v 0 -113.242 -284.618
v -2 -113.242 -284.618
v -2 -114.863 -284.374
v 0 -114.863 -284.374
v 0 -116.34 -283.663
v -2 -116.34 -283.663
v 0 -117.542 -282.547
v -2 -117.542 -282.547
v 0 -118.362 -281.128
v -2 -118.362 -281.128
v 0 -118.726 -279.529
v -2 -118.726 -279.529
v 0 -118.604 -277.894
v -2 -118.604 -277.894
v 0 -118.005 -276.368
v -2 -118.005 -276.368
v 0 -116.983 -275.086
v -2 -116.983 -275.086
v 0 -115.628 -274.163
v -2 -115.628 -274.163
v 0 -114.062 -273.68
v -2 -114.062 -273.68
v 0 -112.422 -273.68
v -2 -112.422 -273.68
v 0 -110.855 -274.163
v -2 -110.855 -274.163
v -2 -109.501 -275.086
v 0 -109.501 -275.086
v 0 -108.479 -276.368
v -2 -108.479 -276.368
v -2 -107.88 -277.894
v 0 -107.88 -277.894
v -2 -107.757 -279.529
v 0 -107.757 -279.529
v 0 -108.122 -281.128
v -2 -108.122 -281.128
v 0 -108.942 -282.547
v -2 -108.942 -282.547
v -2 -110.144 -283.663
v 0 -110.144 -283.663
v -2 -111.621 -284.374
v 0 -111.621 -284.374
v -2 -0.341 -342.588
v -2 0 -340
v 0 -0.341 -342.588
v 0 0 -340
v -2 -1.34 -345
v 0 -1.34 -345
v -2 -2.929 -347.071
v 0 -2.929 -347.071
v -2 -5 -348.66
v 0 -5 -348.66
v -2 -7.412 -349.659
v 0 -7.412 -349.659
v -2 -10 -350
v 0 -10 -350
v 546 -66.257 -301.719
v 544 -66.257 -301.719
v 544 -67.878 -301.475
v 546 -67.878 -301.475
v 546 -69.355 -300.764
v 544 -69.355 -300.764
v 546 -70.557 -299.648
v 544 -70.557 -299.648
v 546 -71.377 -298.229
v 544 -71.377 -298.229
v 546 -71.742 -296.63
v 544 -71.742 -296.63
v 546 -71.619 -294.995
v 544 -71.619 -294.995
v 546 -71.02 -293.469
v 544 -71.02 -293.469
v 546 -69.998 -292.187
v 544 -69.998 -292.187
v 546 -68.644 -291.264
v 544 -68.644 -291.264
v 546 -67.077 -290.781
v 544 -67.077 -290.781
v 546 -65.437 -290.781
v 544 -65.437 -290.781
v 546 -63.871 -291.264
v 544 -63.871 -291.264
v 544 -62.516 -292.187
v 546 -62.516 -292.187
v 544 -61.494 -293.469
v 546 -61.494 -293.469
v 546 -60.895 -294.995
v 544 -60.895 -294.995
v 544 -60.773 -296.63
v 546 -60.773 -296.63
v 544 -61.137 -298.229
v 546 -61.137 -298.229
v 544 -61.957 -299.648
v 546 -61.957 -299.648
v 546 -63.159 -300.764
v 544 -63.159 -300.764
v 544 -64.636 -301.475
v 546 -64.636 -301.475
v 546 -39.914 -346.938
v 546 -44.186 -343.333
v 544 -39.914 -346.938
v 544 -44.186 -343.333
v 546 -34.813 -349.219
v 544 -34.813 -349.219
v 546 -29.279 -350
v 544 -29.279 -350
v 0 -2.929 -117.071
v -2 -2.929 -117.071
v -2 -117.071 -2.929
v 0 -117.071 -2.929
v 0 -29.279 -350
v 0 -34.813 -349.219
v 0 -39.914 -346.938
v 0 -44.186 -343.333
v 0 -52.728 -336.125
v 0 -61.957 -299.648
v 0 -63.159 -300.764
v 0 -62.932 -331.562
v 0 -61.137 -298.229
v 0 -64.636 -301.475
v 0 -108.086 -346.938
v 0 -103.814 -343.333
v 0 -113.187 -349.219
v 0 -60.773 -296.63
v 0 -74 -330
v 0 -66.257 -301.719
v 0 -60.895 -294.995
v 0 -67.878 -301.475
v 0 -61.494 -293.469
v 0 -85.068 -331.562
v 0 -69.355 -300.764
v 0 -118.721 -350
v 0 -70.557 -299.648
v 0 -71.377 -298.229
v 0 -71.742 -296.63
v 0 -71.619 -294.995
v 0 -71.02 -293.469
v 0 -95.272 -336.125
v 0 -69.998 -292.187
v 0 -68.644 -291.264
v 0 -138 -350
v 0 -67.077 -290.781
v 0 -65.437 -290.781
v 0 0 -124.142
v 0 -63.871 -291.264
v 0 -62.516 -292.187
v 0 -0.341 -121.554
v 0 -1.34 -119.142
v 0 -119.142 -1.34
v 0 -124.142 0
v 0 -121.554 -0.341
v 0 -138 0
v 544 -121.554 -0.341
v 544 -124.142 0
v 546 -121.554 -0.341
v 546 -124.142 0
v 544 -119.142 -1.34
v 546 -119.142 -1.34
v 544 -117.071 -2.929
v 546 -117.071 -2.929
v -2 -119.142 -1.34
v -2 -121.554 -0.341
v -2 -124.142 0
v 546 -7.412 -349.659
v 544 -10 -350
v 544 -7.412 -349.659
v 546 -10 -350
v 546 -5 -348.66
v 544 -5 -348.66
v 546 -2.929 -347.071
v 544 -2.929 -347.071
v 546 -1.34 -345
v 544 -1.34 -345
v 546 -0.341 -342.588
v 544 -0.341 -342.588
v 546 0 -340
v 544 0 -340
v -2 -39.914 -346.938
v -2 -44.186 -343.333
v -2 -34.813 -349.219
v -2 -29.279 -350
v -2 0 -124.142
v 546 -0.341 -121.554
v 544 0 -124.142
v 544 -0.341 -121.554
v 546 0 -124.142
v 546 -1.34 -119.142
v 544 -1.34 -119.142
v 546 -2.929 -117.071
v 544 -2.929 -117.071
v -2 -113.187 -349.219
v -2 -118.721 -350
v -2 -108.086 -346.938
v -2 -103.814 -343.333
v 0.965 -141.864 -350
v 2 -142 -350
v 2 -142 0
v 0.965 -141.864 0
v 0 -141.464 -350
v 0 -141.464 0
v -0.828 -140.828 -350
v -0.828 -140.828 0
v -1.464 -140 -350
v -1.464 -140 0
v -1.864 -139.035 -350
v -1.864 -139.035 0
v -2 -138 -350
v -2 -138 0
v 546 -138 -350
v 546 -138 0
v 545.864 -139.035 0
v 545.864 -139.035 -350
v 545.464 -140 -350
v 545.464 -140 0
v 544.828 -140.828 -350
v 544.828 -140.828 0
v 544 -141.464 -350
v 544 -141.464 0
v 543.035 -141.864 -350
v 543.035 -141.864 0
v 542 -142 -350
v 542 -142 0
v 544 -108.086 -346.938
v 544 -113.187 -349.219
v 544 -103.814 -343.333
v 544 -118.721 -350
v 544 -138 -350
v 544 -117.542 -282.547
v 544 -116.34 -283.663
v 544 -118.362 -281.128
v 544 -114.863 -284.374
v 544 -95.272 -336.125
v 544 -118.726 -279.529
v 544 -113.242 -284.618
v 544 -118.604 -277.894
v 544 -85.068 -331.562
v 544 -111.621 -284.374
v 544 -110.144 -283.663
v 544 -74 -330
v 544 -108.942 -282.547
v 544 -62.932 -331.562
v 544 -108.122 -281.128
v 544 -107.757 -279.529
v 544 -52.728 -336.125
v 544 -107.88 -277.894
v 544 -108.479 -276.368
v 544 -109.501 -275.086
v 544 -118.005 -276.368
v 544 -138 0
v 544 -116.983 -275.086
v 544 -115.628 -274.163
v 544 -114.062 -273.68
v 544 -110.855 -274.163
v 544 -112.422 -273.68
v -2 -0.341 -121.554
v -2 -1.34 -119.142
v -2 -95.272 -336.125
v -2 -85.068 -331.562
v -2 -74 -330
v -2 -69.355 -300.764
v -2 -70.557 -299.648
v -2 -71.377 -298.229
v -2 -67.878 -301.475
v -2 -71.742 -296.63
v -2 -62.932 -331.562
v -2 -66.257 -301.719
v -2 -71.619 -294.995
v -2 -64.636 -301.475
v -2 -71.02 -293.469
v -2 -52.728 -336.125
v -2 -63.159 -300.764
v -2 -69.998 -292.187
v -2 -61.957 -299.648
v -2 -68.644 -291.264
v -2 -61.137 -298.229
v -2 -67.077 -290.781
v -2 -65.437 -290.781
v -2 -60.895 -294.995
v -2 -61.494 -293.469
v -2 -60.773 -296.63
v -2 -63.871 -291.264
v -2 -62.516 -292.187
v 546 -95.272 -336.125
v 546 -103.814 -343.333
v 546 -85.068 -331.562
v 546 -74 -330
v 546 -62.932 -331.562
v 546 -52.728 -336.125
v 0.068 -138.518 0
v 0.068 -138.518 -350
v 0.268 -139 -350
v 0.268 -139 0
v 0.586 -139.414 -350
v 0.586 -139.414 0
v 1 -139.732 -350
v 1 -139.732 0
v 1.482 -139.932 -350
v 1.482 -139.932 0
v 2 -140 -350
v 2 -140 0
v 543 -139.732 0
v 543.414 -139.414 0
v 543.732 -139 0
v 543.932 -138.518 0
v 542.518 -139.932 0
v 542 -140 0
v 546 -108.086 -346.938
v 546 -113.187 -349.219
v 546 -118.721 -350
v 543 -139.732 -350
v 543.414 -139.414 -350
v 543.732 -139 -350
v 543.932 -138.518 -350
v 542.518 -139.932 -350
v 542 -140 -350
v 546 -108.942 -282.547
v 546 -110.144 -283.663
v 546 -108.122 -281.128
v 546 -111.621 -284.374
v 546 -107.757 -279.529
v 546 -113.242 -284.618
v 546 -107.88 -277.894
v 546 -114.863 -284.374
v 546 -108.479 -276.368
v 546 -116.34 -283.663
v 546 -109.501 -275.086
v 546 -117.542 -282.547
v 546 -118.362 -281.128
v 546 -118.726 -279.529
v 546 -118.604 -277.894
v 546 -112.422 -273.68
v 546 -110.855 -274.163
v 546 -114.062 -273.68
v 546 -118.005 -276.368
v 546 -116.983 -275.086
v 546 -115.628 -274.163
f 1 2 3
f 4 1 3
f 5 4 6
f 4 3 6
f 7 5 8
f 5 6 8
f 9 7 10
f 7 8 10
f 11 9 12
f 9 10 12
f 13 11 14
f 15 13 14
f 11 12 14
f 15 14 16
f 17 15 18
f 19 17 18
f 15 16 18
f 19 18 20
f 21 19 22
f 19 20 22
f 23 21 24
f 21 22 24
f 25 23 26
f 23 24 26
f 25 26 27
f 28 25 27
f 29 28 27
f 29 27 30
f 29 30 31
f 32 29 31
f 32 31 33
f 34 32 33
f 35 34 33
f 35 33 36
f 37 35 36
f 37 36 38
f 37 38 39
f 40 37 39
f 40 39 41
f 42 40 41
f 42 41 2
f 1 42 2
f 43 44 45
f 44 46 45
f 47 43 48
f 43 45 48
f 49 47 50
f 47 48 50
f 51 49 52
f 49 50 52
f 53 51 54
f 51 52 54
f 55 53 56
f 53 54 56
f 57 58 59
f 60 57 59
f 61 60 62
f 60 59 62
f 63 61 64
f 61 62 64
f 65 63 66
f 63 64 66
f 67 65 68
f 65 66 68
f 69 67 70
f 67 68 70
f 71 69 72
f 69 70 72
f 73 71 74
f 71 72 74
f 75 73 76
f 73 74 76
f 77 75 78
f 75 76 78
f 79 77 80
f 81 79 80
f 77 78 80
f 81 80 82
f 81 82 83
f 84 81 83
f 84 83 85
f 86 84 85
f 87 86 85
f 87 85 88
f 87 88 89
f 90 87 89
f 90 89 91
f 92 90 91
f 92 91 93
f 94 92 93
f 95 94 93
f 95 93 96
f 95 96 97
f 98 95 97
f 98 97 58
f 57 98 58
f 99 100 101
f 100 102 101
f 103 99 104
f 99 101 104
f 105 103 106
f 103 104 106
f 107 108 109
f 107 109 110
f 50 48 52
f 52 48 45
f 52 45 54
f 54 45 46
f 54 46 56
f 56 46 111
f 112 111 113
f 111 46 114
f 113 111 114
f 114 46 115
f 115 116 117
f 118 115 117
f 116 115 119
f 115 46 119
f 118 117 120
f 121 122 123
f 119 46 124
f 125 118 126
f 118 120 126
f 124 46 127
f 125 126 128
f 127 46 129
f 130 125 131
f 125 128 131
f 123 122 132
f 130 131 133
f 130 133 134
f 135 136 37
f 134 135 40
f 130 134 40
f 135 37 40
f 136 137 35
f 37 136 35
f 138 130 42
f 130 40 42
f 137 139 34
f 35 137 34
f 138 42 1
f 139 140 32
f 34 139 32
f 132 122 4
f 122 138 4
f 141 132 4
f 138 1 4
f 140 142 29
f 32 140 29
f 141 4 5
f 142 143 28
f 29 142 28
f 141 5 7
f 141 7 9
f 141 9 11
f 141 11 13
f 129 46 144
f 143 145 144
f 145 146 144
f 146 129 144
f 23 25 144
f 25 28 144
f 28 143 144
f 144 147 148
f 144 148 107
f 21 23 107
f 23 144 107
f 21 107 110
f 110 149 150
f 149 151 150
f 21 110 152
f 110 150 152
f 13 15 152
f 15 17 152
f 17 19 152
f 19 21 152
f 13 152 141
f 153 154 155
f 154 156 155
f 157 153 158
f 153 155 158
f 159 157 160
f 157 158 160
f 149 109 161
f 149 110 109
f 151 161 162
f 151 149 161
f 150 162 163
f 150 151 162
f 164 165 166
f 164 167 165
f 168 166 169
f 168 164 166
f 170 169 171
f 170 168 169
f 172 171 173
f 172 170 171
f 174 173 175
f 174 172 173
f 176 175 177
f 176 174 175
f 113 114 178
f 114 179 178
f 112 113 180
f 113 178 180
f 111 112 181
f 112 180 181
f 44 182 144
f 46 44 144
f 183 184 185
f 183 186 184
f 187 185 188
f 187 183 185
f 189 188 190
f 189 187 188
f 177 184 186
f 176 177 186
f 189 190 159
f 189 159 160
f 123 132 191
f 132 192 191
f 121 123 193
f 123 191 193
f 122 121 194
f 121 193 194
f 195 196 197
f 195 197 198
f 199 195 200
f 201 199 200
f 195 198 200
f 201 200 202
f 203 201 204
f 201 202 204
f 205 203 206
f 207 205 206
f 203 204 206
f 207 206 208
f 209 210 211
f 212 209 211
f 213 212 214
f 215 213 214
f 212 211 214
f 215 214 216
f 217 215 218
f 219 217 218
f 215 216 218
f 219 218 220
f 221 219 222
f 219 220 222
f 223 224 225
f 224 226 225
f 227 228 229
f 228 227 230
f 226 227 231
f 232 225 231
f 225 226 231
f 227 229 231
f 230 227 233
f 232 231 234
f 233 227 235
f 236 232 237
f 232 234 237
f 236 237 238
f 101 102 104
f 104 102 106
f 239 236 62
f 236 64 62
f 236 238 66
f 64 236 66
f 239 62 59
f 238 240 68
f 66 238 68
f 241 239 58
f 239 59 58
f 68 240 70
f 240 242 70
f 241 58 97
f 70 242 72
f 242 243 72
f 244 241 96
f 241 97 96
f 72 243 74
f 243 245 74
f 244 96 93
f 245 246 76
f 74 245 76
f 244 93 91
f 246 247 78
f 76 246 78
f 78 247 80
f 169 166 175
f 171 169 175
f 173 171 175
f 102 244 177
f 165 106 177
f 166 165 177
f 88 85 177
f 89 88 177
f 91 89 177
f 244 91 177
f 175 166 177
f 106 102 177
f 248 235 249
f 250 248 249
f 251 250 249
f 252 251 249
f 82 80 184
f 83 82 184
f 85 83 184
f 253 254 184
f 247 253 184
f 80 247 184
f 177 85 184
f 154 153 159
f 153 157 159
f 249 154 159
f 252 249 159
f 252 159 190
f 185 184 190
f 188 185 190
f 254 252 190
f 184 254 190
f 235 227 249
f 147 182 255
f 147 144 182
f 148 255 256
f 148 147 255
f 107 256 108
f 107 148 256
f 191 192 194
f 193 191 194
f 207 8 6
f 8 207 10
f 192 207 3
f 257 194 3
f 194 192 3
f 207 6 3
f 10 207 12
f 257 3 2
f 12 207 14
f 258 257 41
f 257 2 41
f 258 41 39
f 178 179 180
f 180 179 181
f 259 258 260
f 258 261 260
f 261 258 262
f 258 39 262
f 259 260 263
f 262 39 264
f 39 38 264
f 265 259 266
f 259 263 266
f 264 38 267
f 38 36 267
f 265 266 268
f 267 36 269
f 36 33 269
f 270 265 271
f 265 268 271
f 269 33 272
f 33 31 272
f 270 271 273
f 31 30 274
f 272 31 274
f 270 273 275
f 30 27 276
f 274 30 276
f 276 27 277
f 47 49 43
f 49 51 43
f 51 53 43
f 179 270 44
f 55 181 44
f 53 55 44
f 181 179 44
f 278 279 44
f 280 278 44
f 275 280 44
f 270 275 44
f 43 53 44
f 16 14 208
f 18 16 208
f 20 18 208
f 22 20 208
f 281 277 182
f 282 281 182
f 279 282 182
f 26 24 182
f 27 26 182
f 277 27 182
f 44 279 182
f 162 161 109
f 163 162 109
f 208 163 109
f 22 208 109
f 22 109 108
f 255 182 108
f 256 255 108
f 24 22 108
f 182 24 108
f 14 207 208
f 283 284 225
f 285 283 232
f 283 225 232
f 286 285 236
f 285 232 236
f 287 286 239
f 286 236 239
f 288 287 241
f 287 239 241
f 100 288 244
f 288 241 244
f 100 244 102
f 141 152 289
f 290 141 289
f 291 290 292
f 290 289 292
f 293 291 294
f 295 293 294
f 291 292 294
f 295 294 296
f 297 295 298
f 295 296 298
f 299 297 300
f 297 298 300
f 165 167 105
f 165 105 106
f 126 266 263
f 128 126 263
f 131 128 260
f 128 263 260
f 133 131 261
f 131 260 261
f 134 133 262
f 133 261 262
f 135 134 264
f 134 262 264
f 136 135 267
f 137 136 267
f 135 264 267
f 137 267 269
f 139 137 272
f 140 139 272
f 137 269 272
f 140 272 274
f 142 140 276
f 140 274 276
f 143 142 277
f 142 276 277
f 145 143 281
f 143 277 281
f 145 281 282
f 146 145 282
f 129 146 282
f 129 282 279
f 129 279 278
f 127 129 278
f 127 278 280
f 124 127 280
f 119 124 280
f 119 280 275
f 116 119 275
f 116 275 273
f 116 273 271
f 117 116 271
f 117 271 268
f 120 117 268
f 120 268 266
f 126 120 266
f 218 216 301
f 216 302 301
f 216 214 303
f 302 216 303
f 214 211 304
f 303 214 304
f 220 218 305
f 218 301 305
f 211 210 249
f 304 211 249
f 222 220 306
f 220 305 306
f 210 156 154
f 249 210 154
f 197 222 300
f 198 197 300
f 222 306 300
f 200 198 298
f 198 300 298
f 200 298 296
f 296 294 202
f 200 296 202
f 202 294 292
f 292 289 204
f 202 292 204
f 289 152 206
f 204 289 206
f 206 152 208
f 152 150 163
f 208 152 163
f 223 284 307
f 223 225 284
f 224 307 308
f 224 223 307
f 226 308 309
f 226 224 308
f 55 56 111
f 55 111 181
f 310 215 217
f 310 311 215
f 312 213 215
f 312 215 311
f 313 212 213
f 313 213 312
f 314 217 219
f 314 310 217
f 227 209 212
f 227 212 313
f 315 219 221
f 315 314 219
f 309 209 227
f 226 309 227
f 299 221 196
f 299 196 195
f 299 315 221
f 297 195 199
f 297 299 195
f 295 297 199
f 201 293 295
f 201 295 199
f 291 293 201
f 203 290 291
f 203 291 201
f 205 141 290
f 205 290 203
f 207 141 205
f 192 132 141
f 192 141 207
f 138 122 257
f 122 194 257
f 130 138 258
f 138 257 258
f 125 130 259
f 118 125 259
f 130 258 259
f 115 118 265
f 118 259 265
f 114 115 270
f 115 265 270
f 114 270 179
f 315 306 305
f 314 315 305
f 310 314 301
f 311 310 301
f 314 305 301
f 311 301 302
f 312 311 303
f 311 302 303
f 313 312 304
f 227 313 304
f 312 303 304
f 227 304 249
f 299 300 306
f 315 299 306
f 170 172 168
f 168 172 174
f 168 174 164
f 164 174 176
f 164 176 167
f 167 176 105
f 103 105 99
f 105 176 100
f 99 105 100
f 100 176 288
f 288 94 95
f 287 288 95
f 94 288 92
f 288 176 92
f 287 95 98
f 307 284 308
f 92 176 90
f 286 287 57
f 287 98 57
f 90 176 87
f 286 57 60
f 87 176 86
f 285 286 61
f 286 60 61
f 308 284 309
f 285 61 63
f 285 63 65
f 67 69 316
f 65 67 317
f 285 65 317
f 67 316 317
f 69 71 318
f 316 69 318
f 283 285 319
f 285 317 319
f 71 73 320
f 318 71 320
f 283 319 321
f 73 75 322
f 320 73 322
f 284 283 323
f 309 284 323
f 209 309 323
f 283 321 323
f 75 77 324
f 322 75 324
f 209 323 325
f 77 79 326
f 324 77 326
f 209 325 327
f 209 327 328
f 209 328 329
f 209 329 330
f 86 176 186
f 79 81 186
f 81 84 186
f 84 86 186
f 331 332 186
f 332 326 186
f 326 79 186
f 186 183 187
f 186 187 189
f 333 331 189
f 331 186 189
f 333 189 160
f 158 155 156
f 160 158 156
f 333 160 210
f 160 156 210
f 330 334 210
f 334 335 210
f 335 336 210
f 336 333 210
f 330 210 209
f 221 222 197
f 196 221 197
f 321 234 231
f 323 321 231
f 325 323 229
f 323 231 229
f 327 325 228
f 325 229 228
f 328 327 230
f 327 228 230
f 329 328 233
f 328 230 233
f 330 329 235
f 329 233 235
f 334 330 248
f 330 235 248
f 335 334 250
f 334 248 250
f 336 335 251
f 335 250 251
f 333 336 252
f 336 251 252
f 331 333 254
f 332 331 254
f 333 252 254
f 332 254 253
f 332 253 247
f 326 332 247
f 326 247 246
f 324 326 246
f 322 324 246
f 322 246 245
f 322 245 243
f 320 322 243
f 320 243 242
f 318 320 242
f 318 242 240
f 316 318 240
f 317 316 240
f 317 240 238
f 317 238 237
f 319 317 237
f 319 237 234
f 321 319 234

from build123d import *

# Parameters (mm, degrees)
TABAN_FLAN_1_DEPTH    = 350
PAH1_SIZE             = 120
IZIM2_R               = 5.5
KES_EKSTR_ZYON1_DEPTH = 614
RADYUS1_R             = 10
RADYUS2_R             = 10
IZIM3_R               = 40
KES_EKSTR_ZYON2_DEPTH = 647
RADYUS3_R             = 20


# Sheet-metal steps are written as plain solids
with BuildPart() as part:
    # Çizim1 → Taban-Flanş1 (new body)
    with BuildSketch(Plane.XY):
        with BuildLine():
            Line((0, 0), (0, -138))
            ThreePointArc((0, -138), (0.585786438, -139.414213562), (2, -140))
            Line((2, -140), (542, -140))
            ThreePointArc((542, -140), (543.414213562, -139.414213562), (544, -138))
            Line((544, -138), (544, 0))
            Line((544, 0), (546, 0))
            Line((546, 0), (546, -138))
            ThreePointArc((546, -138), (544.828427125, -140.828427125), (542, -142))
            Line((542, -142), (2, -142))
            ThreePointArc((2, -142), (-0.828427125, -140.828427125), (-2, -138))
            Line((-2, -138), (-2, 0))
            Line((-2, 0), (0, 0))
        make_face()
    extrude(amount=-TABAN_FLAN_1_DEPTH)

    # Pah1
    pah1_edges = [part.edges().sort_by_distance(p)[0] for p in [
        (-1, 0, 0),
        (545, 0, 0),
    ]]
    chamfer(pah1_edges, length=PAH1_SIZE)

    # Çizim2 → Kes-Ekstrüzyon1 (cut)
    with BuildSketch(Plane.ZY.offset(2)):
        with Locations(Location((-279.118209744, -113.241831987, 0), (0, 0, 180))):
            Circle(IZIM2_R)
        with Locations(Location((-296.219216911, -66.257200948, 0), (0, 0, 180))):
            Circle(IZIM2_R)
    extrude(amount=-KES_EKSTR_ZYON1_DEPTH, mode=Mode.SUBTRACT)

    # Radyus1
    radyus1_edges = [part.edges().sort_by_distance(p)[0] for p in [
        (-1, 0, -350),
        (545, 0, -120),
        (-1, 0, -120),
        (545, 0, -350),
    ]]
    fillet(radyus1_edges, radius=RADYUS1_R)

    # Radyus2
    radyus2_edges = [part.edges().sort_by_distance(p)[0] for p in [
        (545, -120, 0),
        (-1, -120, 0),
    ]]
    fillet(radyus2_edges, radius=RADYUS2_R)

    # Çizim3 → Kes-Ekstrüzyon2 (cut)
    with BuildSketch(Plane.ZY.offset(2)):
        with Locations((-370, -74)):
            Circle(IZIM3_R)
    extrude(amount=-KES_EKSTR_ZYON2_DEPTH, mode=Mode.SUBTRACT)

    # Radyus3
    radyus3_edges = [part.edges().sort_by_distance(p)[0] for p in [
        (545, -39.358983849, -350),
        (545, -108.641016151, -350),
        (-1, -108.641016151, -350),
        (-1, -39.358983849, -350),
    ]]
    fillet(radyus3_edges, radius=RADYUS3_R)


solid = part.part
